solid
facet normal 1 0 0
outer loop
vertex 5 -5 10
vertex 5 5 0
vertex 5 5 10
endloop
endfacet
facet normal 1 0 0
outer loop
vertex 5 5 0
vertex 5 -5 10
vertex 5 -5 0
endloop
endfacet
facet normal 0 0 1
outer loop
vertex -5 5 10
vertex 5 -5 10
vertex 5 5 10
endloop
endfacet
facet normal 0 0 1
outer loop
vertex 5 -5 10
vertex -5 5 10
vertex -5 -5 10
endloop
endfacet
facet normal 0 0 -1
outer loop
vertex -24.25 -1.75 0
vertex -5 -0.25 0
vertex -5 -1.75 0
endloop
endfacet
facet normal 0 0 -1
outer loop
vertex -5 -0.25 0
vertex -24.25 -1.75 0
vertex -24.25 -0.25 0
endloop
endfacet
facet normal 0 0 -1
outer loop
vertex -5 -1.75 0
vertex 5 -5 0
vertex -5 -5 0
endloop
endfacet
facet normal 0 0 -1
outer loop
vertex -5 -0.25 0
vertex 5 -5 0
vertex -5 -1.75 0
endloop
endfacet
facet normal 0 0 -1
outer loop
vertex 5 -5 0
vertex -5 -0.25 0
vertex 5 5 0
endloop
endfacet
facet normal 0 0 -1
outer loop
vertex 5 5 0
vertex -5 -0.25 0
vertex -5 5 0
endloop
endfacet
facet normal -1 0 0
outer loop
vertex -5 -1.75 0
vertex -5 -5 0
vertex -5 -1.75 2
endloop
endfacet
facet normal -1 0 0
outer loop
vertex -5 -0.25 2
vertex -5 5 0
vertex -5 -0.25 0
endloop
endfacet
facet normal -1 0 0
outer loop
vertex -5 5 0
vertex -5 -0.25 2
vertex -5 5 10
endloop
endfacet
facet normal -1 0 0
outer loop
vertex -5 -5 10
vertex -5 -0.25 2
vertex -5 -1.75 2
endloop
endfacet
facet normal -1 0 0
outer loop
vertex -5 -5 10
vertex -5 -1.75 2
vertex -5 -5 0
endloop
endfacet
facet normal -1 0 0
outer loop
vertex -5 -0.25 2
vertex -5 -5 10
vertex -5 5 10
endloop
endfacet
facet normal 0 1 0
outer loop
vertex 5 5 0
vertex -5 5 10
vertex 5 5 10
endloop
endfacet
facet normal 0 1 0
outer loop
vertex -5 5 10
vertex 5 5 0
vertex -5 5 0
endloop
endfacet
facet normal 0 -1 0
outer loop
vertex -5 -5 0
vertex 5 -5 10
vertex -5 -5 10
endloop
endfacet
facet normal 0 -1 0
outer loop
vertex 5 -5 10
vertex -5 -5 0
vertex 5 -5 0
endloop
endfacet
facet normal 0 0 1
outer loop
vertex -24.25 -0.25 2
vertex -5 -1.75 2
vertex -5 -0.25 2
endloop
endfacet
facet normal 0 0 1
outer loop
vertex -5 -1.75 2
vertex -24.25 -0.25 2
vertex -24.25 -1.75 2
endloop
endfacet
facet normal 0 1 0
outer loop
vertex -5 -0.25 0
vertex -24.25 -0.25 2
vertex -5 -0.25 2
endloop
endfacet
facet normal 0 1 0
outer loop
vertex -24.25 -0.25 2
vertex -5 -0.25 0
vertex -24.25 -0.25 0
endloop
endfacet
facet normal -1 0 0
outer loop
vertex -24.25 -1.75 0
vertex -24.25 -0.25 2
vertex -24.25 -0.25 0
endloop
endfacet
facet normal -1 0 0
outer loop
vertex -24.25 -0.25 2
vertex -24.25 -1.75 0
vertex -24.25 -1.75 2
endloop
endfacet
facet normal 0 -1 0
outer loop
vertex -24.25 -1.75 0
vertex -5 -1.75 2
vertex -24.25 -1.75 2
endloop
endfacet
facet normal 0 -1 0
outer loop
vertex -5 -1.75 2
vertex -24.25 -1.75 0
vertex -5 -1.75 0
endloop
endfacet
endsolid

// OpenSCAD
translate([0, 0, 5]) color([0,1,0,0.9]) cube([10, 10, 10], center=true);
translate([-0.5, -0.5, 1]) color([1,0,0]) cube([0.5, 0.5, 2], center=true);
translate([-1.0, -0.5, 1]) color([1,0,0]) cube([0.5, 0.5, 2], center=true);
translate([-1.5, -0.5, 1]) color([1,0,0]) cube([0.5, 0.5, 2], center=true);
translate([-2.0, -0.5, 1]) color([1,0,0]) cube([0.5, 0.5, 2], center=true);
translate([-2.5, -0.5, 1]) color([1,0,0]) cube([0.5, 0.5, 2], center=true);
translate([-3.0, -0.5, 1]) color([1,0,0]) cube([0.5, 0.5, 2], center=true);
translate([-3.5, -0.5, 1]) color([1,0,0]) cube([0.5, 0.5, 2], center=true);
translate([-4.0, -0.5, 1]) color([1,0,0]) cube([0.5, 0.5, 2], center=true);
translate([-4.5, -0.5, 1]) color([1,0,0]) cube([0.5, 0.5, 2], center=true);
translate([-5.0, -0.5, 1]) color([1,0,0]) cube([0.5, 0.5, 2], center=true);
translate([-5.5, -0.5, 1]) color([1,0,0]) cube([0.5, 0.5, 2], center=true);
translate([-6.0, -0.5, 1]) color([1,0,0]) cube([0.5, 0.5, 2], center=true);
translate([-6.5, -0.5, 1]) color([1,0,0]) cube([0.5, 0.5, 2], center=true);
translate([-7.0, -0.5, 1]) color([1,0,0]) cube([0.5, 0.5, 2], center=true);
translate([-7.5, -0.5, 1]) color([1,0,0]) cube([0.5, 0.5, 2], center=true);
translate([-8.0, -0.5, 1]) color([1,0,0]) cube([0.5, 0.5, 2], center=true);
translate([-8.5, -0.5, 1]) color([1,0,0]) cube([0.5, 0.5, 2], center=true);
translate([-9.0, -0.5, 1]) color([1,0,0]) cube([0.5, 0.5, 2], center=true);
translate([-9.5, -0.5, 1]) color([1,0,0]) cube([0.5, 0.5, 2], center=true);
translate([-10.0, -0.5, 1]) color([1,0,0]) cube([0.5, 0.5, 2], center=true);
translate([-10.5, -0.5, 1]) color([1,0,0]) cube([0.5, 0.5, 2], center=true);
translate([-11.0, -0.5, 1]) color([1,0,0]) cube([0.5, 0.5, 2], center=true);
translate([-11.5, -0.5, 1]) color([1,0,0]) cube([0.5, 0.5, 2], center=true);
translate([-12.0, -0.5, 1]) color([1,0,0]) cube([0.5, 0.5, 2], center=true);
translate([-12.5, -0.5, 1]) color([1,0,0]) cube([0.5, 0.5, 2], center=true);
translate([-13.0, -0.5, 1]) color([1,0,0]) cube([0.5, 0.5, 2], center=true);
translate([-13.5, -0.5, 1]) color([1,0,0]) cube([0.5, 0.5, 2], center=true);
translate([-14.0, -0.5, 1]) color([1,0,0]) cube([0.5, 0.5, 2], center=true);
translate([-14.5, -0.5, 1]) color([1,0,0]) cube([0.5, 0.5, 2], center=true);
translate([-15.0, -0.5, 1]) color([1,0,0]) cube([0.5, 0.5, 2], center=true);
translate([-15.5, -0.5, 1]) color([1,0,0]) cube([0.5, 0.5, 2], center=true);
translate([-16.0, -0.5, 1]) color([1,0,0]) cube([0.5, 0.5, 2], center=true);
translate([-16.5, -0.5, 1]) color([1,0,0]) cube([0.5, 0.5, 2], center=true);
translate([-17.0, -0.5, 1]) color([1,0,0]) cube([0.5, 0.5, 2], center=true);
translate([-17.5, -0.5, 1]) color([1,0,0]) cube([0.5, 0.5, 2], center=true);
translate([-18.0, -0.5, 1]) color([1,0,0]) cube([0.5, 0.5, 2], center=true);
translate([-18.5, -0.5, 1]) color([1,0,0]) cube([0.5, 0.5, 2], center=true);
translate([-19.0, -0.5, 1]) color([1,0,0]) cube([0.5, 0.5, 2], center=true);
translate([-19.5, -0.5, 1]) color([1,0,0]) cube([0.5, 0.5, 2], center=true);
translate([-20.0, -0.5, 1]) color([1,0,0]) cube([0.5, 0.5, 2], center=true);
translate([-20.5, -0.5, 1]) color([1,0,0]) cube([0.5, 0.5, 2], center=true);
translate([-21.0, -0.5, 1]) color([1,0,0]) cube([0.5, 0.5, 2], center=true);
translate([-21.5, -0.5, 1]) color([1,0,0]) cube([0.5, 0.5, 2], center=true);
translate([-22.0, -0.5, 1]) color([1,0,0]) cube([0.5, 0.5, 2], center=true);
translate([-22.5, -0.5, 1]) color([1,0,0]) cube([0.5, 0.5, 2], center=true);
translate([-23.0, -0.5, 1]) color([1,0,0]) cube([0.5, 0.5, 2], center=true);
translate([-23.5, -0.5, 1]) color([1,0,0]) cube([0.5, 0.5, 2], center=true);
translate([-24.0, -0.5, 1]) color([1,0,0]) cube([0.5, 0.5, 2], center=true);
translate([-0.5, -1.0, 1]) color([1,0,0]) cube([0.5, 0.5, 2], center=true);
translate([-1.0, -1.0, 1]) color([1,0,0]) cube([0.5, 0.5, 2], center=true);
translate([-1.5, -1.0, 1]) color([1,0,0]) cube([0.5, 0.5, 2], center=true);
translate([-2.0, -1.0, 1]) color([1,0,0]) cube([0.5, 0.5, 2], center=true);
translate([-2.5, -1.0, 1]) color([1,0,0]) cube([0.5, 0.5, 2], center=true);
translate([-3.0, -1.0, 1]) color([1,0,0]) cube([0.5, 0.5, 2], center=true);
translate([-3.5, -1.0, 1]) color([1,0,0]) cube([0.5, 0.5, 2], center=true);
translate([-4.0, -1.0, 1]) color([1,0,0]) cube([0.5, 0.5, 2], center=true);
translate([-4.5, -1.0, 1]) color([1,0,0]) cube([0.5, 0.5, 2], center=true);
translate([-5.0, -1.0, 1]) color([1,0,0]) cube([0.5, 0.5, 2], center=true);
translate([-5.5, -1.0, 1]) color([1,0,0]) cube([0.5, 0.5, 2], center=true);
translate([-6.0, -1.0, 1]) color([1,0,0]) cube([0.5, 0.5, 2], center=true);
translate([-6.5, -1.0, 1]) color([1,0,0]) cube([0.5, 0.5, 2], center=true);
translate([-7.0, -1.0, 1]) color([1,0,0]) cube([0.5, 0.5, 2], center=true);
translate([-7.5, -1.0, 1]) color([1,0,0]) cube([0.5, 0.5, 2], center=true);
translate([-8.0, -1.0, 1]) color([1,0,0]) cube([0.5, 0.5, 2], center=true);
translate([-8.5, -1.0, 1]) color([1,0,0]) cube([0.5, 0.5, 2], center=true);
translate([-9.0, -1.0, 1]) color([1,0,0]) cube([0.5, 0.5, 2], center=true);
translate([-9.5, -1.0, 1]) color([1,0,0]) cube([0.5, 0.5, 2], center=true);
translate([-10.0, -1.0, 1]) color([1,0,0]) cube([0.5, 0.5, 2], center=true);
translate([-10.5, -1.0, 1]) color([1,0,0]) cube([0.5, 0.5, 2], center=true);
translate([-11.0, -1.0, 1]) color([1,0,0]) cube([0.5, 0.5, 2], center=true);
translate([-11.5, -1.0, 1]) color([1,0,0]) cube([0.5, 0.5, 2], center=true);
translate([-12.0, -1.0, 1]) color([1,0,0]) cube([0.5, 0.5, 2], center=true);
translate([-12.5, -1.0, 1]) color([1,0,0]) cube([0.5, 0.5, 2], center=true);
translate([-13.0, -1.0, 1]) color([1,0,0]) cube([0.5, 0.5, 2], center=true);
translate([-13.5, -1.0, 1]) color([1,0,0]) cube([0.5, 0.5, 2], center=true);
translate([-14.0, -1.0, 1]) color([1,0,0]) cube([0.5, 0.5, 2], center=true);
translate([-14.5, -1.0, 1]) color([1,0,0]) cube([0.5, 0.5, 2], center=true);
translate([-15.0, -1.0, 1]) color([1,0,0]) cube([0.5, 0.5, 2], center=true);
translate([-15.5, -1.0, 1]) color([1,0,0]) cube([0.5, 0.5, 2], center=true);
translate([-16.0, -1.0, 1]) color([1,0,0]) cube([0.5, 0.5, 2], center=true);
translate([-16.5, -1.0, 1]) color([1,0,0]) cube([0.5, 0.5, 2], center=true);
translate([-17.0, -1.0, 1]) color([1,0,0]) cube([0.5, 0.5, 2], center=true);
translate([-17.5, -1.0, 1]) color([1,0,0]) cube([0.5, 0.5, 2], center=true);
translate([-18.0, -1.0, 1]) color([1,0,0]) cube([0.5, 0.5, 2], center=true);
translate([-18.5, -1.0, 1]) color([1,0,0]) cube([0.5, 0.5, 2], center=true);
translate([-19.0, -1.0, 1]) color([1,0,0]) cube([0.5, 0.5, 2], center=true);
translate([-19.5, -1.0, 1]) color([1,0,0]) cube([0.5, 0.5, 2], center=true);
translate([-20.0, -1.0, 1]) color([1,0,0]) cube([0.5, 0.5, 2], center=true);
translate([-20.5, -1.0, 1]) color([1,0,0]) cube([0.5, 0.5, 2], center=true);
translate([-21.0, -1.0, 1]) color([1,0,0]) cube([0.5, 0.5, 2], center=true);
translate([-21.5, -1.0, 1]) color([1,0,0]) cube([0.5, 0.5, 2], center=true);
translate([-22.0, -1.0, 1]) color([1,0,0]) cube([0.5, 0.5, 2], center=true);
translate([-22.5, -1.0, 1]) color([1,0,0]) cube([0.5, 0.5, 2], center=true);
translate([-23.0, -1.0, 1]) color([1,0,0]) cube([0.5, 0.5, 2], center=true);
translate([-23.5, -1.0, 1]) color([1,0,0]) cube([0.5, 0.5, 2], center=true);
translate([-24.0, -1.0, 1]) color([1,0,0]) cube([0.5, 0.5, 2], center=true);
translate([-0.5, -1.5, 1]) color([1,0,0]) cube([0.5, 0.5, 2], center=true);
translate([-1.0, -1.5, 1]) color([1,0,0]) cube([0.5, 0.5, 2], center=true);
translate([-1.5, -1.5, 1]) color([1,0,0]) cube([0.5, 0.5, 2], center=true);
translate([-2.0, -1.5, 1]) color([1,0,0]) cube([0.5, 0.5, 2], center=true);
translate([-2.5, -1.5, 1]) color([1,0,0]) cube([0.5, 0.5, 2], center=true);
translate([-3.0, -1.5, 1]) color([1,0,0]) cube([0.5, 0.5, 2], center=true);
translate([-3.5, -1.5, 1]) color([1,0,0]) cube([0.5, 0.5, 2], center=true);
translate([-4.0, -1.5, 1]) color([1,0,0]) cube([0.5, 0.5, 2], center=true);
translate([-4.5, -1.5, 1]) color([1,0,0]) cube([0.5, 0.5, 2], center=true);
translate([-5.0, -1.5, 1]) color([1,0,0]) cube([0.5, 0.5, 2], center=true);
translate([-5.5, -1.5, 1]) color([1,0,0]) cube([0.5, 0.5, 2], center=true);
translate([-6.0, -1.5, 1]) color([1,0,0]) cube([0.5, 0.5, 2], center=true);
translate([-6.5, -1.5, 1]) color([1,0,0]) cube([0.5, 0.5, 2], center=true);
translate([-7.0, -1.5, 1]) color([1,0,0]) cube([0.5, 0.5, 2], center=true);
translate([-7.5, -1.5, 1]) color([1,0,0]) cube([0.5, 0.5, 2], center=true);
translate([-8.0, -1.5, 1]) color([1,0,0]) cube([0.5, 0.5, 2], center=true);
translate([-8.5, -1.5, 1]) color([1,0,0]) cube([0.5, 0.5, 2], center=true);
translate([-9.0, -1.5, 1]) color([1,0,0]) cube([0.5, 0.5, 2], center=true);
translate([-9.5, -1.5, 1]) color([1,0,0]) cube([0.5, 0.5, 2], center=true);
translate([-10.0, -1.5, 1]) color([1,0,0]) cube([0.5, 0.5, 2], center=true);
translate([-10.5, -1.5, 1]) color([1,0,0]) cube([0.5, 0.5, 2], center=true);
translate([-11.0, -1.5, 1]) color([1,0,0]) cube([0.5, 0.5, 2], center=true);
translate([-11.5, -1.5, 1]) color([1,0,0]) cube([0.5, 0.5, 2], center=true);
translate([-12.0, -1.5, 1]) color([1,0,0]) cube([0.5, 0.5, 2], center=true);
translate([-12.5, -1.5, 1]) color([1,0,0]) cube([0.5, 0.5, 2], center=true);
translate([-13.0, -1.5, 1]) color([1,0,0]) cube([0.5, 0.5, 2], center=true);
translate([-13.5, -1.5, 1]) color([1,0,0]) cube([0.5, 0.5, 2], center=true);
translate([-14.0, -1.5, 1]) color([1,0,0]) cube([0.5, 0.5, 2], center=true);
translate([-14.5, -1.5, 1]) color([1,0,0]) cube([0.5, 0.5, 2], center=true);
translate([-15.0, -1.5, 1]) color([1,0,0]) cube([0.5, 0.5, 2], center=true);
translate([-15.5, -1.5, 1]) color([1,0,0]) cube([0.5, 0.5, 2], center=true);
translate([-16.0, -1.5, 1]) color([1,0,0]) cube([0.5, 0.5, 2], center=true);
translate([-16.5, -1.5, 1]) color([1,0,0]) cube([0.5, 0.5, 2], center=true);
translate([-17.0, -1.5, 1]) color([1,0,0]) cube([0.5, 0.5, 2], center=true);
translate([-17.5, -1.5, 1]) color([1,0,0]) cube([0.5, 0.5, 2], center=true);
translate([-18.0, -1.5, 1]) color([1,0,0]) cube([0.5, 0.5, 2], center=true);
translate([-18.5, -1.5, 1]) color([1,0,0]) cube([0.5, 0.5, 2], center=true);
translate([-19.0, -1.5, 1]) color([1,0,0]) cube([0.5, 0.5, 2], center=true);
translate([-19.5, -1.5, 1]) color([1,0,0]) cube([0.5, 0.5, 2], center=true);
translate([-20.0, -1.5, 1]) color([1,0,0]) cube([0.5, 0.5, 2], center=true);
translate([-20.5, -1.5, 1]) color([1,0,0]) cube([0.5, 0.5, 2], center=true);
translate([-21.0, -1.5, 1]) color([1,0,0]) cube([0.5, 0.5, 2], center=true);
translate([-21.5, -1.5, 1]) color([1,0,0]) cube([0.5, 0.5, 2], center=true);
translate([-22.0, -1.5, 1]) color([1,0,0]) cube([0.5, 0.5, 2], center=true);
translate([-22.5, -1.5, 1]) color([1,0,0]) cube([0.5, 0.5, 2], center=true);
translate([-23.0, -1.5, 1]) color([1,0,0]) cube([0.5, 0.5, 2], center=true);
translate([-23.5, -1.5, 1]) color([1,0,0]) cube([0.5, 0.5, 2], center=true);
translate([-24.0, -1.5, 1]) color([1,0,0]) cube([0.5, 0.5, 2], center=true);
